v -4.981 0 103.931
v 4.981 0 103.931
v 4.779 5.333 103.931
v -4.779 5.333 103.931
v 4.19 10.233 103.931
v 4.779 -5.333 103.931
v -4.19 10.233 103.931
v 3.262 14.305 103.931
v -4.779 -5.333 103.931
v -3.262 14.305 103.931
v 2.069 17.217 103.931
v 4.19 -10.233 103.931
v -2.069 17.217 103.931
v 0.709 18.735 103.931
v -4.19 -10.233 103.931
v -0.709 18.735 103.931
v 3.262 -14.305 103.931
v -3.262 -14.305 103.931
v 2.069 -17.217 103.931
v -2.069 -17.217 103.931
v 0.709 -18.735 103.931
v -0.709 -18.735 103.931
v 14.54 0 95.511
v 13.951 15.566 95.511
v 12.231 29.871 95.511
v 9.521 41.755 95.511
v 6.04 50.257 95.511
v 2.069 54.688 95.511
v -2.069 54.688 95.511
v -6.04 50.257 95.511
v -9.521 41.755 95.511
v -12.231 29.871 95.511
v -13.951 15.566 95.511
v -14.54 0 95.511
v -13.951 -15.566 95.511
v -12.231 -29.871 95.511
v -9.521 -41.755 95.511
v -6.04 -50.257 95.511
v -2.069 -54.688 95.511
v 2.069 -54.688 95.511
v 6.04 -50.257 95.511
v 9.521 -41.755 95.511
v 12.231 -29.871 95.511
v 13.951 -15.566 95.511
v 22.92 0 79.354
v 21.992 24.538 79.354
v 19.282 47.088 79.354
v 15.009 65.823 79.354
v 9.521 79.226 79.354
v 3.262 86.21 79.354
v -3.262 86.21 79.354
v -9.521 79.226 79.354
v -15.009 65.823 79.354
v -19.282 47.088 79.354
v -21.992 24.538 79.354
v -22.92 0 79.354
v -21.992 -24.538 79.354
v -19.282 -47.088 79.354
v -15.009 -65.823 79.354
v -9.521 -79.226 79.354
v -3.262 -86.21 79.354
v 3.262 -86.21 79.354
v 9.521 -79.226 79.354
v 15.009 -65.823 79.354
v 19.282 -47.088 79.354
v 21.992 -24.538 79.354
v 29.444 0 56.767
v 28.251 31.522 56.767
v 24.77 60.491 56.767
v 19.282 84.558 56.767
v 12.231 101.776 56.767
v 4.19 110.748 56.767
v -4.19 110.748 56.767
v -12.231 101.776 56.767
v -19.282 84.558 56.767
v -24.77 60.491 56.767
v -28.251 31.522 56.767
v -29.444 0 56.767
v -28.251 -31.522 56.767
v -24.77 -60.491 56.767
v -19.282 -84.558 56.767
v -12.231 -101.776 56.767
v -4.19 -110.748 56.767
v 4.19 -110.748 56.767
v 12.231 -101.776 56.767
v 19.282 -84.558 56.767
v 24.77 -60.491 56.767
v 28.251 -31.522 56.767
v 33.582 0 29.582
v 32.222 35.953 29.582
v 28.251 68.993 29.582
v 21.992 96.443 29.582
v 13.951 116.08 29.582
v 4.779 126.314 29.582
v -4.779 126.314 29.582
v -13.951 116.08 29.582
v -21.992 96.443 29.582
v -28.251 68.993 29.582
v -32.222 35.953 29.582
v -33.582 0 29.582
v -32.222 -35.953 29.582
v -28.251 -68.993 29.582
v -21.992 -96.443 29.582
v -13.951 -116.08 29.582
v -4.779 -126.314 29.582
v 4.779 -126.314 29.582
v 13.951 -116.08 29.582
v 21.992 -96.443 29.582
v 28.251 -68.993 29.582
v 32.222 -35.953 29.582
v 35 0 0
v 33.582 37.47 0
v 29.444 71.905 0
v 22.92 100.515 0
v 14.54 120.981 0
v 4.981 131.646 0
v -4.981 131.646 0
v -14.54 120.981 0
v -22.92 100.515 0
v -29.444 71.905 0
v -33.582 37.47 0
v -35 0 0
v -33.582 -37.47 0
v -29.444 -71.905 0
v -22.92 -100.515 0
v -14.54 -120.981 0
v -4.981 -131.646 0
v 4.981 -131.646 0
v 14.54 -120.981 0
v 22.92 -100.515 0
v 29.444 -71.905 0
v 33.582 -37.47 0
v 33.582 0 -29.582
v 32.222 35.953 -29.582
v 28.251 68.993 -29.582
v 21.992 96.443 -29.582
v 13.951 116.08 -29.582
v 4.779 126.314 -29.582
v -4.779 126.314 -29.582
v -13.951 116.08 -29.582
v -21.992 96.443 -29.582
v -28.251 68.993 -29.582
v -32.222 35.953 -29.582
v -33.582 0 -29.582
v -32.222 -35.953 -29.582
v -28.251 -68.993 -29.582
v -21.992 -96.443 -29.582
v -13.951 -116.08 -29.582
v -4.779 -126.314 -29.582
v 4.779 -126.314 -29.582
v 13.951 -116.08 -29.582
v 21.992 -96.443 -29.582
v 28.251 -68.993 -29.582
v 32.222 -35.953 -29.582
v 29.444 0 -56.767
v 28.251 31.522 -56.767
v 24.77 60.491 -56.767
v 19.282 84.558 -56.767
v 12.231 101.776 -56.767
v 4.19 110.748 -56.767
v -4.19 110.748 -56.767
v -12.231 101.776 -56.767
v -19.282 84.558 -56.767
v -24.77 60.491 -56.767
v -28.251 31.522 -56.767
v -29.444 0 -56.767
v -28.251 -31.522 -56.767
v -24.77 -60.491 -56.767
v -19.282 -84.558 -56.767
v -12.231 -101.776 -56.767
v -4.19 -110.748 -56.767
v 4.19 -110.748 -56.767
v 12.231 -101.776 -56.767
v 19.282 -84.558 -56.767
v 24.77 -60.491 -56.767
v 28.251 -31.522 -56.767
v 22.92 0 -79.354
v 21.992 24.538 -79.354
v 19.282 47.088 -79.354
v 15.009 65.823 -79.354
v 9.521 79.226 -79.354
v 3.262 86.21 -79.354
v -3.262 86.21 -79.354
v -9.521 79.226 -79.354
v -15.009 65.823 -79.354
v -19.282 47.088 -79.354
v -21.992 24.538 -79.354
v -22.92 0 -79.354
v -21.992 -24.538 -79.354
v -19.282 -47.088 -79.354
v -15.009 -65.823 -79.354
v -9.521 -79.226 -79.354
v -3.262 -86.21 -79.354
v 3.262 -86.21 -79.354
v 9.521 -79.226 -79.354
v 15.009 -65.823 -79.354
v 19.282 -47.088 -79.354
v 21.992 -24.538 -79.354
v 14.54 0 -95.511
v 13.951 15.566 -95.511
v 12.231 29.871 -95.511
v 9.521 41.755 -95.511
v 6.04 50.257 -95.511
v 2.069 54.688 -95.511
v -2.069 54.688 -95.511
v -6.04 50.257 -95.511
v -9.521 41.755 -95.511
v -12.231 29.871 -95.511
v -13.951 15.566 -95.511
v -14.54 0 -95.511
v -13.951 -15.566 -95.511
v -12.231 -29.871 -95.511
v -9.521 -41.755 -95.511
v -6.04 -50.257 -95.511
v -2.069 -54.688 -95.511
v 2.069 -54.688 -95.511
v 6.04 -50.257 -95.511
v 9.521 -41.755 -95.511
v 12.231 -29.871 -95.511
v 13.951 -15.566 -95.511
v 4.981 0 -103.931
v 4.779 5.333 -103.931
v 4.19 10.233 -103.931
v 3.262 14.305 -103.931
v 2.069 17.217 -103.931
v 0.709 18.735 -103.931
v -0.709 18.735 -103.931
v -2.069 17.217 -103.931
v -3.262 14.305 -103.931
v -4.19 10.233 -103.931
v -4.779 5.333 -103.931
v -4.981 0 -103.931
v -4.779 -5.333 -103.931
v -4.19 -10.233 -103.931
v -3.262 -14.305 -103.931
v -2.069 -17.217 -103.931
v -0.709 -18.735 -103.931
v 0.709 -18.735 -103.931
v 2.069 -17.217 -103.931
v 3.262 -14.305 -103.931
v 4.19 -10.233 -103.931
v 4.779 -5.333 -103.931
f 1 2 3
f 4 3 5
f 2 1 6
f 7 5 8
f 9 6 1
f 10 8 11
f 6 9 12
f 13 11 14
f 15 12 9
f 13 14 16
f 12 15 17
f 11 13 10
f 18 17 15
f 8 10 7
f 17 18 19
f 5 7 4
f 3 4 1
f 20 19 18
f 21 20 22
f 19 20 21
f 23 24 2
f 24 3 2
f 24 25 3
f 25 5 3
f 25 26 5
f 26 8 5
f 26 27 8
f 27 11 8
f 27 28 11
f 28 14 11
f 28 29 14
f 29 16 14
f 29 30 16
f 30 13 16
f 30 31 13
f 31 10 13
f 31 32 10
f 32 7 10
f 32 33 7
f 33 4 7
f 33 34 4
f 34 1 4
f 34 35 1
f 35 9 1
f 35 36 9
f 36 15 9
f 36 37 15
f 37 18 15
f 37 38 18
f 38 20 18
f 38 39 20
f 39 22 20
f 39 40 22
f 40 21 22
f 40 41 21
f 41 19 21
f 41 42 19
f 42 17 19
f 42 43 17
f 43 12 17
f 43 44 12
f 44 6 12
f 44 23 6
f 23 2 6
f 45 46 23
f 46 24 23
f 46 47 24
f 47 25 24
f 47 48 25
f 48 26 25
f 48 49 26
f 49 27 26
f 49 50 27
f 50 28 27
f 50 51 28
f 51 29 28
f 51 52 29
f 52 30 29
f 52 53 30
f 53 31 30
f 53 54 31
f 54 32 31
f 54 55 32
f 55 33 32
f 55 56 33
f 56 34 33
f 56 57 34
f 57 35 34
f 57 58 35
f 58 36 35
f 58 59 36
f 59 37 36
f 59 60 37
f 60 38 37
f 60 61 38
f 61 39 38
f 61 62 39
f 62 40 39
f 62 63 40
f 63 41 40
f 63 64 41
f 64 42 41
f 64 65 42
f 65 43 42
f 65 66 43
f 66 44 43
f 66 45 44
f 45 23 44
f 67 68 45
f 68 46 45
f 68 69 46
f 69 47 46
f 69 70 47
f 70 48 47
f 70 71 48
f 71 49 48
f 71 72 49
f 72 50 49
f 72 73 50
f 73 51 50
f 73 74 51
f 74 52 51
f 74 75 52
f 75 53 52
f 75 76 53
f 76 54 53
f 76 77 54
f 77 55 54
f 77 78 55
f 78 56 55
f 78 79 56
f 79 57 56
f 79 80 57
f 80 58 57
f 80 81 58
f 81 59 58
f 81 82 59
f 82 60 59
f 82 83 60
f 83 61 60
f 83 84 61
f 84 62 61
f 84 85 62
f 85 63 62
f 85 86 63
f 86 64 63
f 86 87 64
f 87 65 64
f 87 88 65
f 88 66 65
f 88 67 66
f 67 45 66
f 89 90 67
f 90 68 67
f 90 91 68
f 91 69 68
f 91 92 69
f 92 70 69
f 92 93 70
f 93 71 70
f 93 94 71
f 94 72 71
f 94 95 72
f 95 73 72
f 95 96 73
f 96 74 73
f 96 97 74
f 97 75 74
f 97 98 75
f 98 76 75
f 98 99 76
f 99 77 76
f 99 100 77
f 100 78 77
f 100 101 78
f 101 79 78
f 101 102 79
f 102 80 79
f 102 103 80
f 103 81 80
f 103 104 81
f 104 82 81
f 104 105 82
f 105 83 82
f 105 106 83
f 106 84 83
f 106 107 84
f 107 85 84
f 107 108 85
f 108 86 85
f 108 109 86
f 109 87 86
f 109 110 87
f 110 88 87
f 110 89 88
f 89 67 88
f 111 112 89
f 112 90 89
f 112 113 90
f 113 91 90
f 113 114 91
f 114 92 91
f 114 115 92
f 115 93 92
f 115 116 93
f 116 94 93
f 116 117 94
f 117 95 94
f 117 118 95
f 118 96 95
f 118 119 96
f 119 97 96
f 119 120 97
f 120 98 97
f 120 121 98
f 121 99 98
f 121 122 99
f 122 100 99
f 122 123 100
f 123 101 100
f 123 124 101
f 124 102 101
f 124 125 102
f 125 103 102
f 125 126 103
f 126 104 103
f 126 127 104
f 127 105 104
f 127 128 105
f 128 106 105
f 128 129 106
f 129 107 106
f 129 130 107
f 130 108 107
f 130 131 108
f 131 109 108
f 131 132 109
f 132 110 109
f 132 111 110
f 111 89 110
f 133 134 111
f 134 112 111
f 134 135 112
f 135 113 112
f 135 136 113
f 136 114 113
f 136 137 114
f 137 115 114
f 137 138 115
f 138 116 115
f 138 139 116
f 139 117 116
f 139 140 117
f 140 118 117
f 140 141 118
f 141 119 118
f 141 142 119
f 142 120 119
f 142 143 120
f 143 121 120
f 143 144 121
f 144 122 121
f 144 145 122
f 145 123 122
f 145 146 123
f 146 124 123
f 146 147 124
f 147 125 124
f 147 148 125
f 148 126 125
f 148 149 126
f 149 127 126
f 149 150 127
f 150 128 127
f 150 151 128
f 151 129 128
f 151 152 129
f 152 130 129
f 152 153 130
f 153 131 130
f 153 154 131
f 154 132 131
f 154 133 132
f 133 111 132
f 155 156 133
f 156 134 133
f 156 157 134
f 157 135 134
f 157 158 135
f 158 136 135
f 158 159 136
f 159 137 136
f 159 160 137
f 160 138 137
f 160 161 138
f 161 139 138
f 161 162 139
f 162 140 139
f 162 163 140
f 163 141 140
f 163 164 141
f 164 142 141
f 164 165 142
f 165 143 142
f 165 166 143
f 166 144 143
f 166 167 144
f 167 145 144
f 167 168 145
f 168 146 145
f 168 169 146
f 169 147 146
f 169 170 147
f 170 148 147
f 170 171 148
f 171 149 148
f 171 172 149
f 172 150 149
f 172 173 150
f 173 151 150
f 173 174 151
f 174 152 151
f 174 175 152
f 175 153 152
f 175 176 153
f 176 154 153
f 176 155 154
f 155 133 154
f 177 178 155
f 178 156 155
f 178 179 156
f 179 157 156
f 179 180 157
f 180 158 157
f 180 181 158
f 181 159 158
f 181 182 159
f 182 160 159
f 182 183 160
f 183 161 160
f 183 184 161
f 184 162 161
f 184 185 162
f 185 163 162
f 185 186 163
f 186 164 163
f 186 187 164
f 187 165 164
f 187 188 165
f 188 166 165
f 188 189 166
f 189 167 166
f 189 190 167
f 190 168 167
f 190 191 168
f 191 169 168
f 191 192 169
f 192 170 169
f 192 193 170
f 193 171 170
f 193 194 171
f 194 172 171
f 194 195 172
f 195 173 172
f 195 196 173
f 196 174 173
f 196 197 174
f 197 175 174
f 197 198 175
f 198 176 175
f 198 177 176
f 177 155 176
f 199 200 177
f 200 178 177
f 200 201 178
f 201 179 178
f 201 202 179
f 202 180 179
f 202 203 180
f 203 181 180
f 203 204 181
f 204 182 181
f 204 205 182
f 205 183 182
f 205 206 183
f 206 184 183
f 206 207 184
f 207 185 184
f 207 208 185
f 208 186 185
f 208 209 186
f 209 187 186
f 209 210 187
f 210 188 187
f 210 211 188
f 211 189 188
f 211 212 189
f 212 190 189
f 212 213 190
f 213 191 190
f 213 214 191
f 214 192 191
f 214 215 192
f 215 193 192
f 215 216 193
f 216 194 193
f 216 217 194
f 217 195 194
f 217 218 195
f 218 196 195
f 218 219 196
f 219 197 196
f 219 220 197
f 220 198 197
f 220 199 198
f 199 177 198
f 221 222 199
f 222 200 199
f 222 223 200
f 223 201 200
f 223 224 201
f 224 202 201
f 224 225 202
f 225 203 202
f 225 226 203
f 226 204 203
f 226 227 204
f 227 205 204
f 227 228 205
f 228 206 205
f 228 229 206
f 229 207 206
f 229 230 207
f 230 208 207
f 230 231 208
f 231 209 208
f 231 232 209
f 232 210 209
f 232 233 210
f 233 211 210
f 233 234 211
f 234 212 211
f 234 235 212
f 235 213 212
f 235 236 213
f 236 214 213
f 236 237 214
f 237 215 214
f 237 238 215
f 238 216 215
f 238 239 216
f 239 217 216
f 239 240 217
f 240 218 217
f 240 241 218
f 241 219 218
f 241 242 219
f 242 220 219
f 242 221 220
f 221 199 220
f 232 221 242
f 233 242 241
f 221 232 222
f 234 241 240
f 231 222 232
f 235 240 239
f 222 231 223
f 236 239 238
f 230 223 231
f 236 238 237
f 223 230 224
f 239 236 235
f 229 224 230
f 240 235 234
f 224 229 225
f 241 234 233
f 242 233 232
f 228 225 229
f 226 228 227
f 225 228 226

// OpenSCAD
// Generated by SolidPython 1.0.1 on 2020-07-29 00:46:47


scale(v = [5, 19, 15]) {
	sphere(r = 7);
}
/***********************************************
*********      SolidPython code:      **********
************************************************
 
# import packages: SolidPython
from solid import *
from solid.utils import *
from itertools import chain, combinations, permutations


class Resize:

    def __init__(self, scad_file):
        self.scad_file = scad_file
        #self.scad_file = import_scad(scad_file)
        # cone/cylinder param:
        self.r1 = 0
        self.r2 = 0
        self.h = 0
        # rectangular prism param:
        self.w = 0
        self.l = 0
        # ellipse param:
        self.r = 0

    # import OpenScad code (file name corresponds to shape)


    # classify shape + parameters
    def assign(self, param1, param2, param3):
        if self.scad_file == 'cone.scad':
            self.r1 = param1
            self.r2 = param2
            self.h = param3
        elif self.scad_file == 'cylinder.scad':
            self.r1 = param1
            self.r2 = param2
            self.h = param3
        elif self.scad_file == 'rectangularPrism.scad':
            self.h = param1
            self.l = param2
            self.w = param3
        else:
            self.r = param1
            self.h = param2

    # resize parameters
    def iterate(self):
        x = range(3, 20, 2)
        i = 1
        if self.scad_file == 'cone.scad':
            tempList = list(permutations(x, 2))
            for temp in tempList:
                param1 = temp[0]
                param2 = temp[1]
                filepath = 'produced_scad_files/' + 'cone' + str(param1) + '_' + str(param2) + '_' + '.scad'
                scad_render_to_file(cylinder(h=param1, r1=param2, r2=0), filepath)

        elif self.scad_file == 'cylinder.scad':
            tempList = list(permutations(x, 3))
            for temp in tempList:
                param1 = temp[0]
                param2 = temp[1]
                filepath = 'produced_scad_files/' + 'cylinder' + str(param1) + '_' + str(param2) + '_' + '.scad'
                scad_render_to_file(cylinder(h=param1, r1=param2, r2=param2), filepath)

        elif self.scad_file == 'rectangularPrism.scad':
            tempList = list(permutations(x, 3))
            for temp in tempList:
                param1 = temp[0]
                param2 = temp[1]
                param3 = temp[2]
                filepath = 'produced_scad_files/' + 'rectangularPrism' + str(param1) + '_' + str(param2) + '_' + str(
                    param3) + '.scad'
                scad_render_to_file(cube(size=(param1, param2, param3)), filepath)

        elif self.scad_file == 'ellipse.scad':
            tempList = list(permutations(x, 4))
            for temp in tempList:
                param1 = temp[0]
                param2 = temp[1]
                param3 = temp[2]
                param4 = temp[3]
                filepath = 'produced_scad_files/' + 'ellipse' + str(param1) + '_' + str(param2) + '_' + str(param3) + '_' + str(param4) + '.scad'
                scad_render_to_file(scale([param1, param2, param3])(sphere(r=param4)), filepath)

    def render_to_scadfile(self):
        scad_render_to_file(scad, 'example.scad') 
 
************************************************/
